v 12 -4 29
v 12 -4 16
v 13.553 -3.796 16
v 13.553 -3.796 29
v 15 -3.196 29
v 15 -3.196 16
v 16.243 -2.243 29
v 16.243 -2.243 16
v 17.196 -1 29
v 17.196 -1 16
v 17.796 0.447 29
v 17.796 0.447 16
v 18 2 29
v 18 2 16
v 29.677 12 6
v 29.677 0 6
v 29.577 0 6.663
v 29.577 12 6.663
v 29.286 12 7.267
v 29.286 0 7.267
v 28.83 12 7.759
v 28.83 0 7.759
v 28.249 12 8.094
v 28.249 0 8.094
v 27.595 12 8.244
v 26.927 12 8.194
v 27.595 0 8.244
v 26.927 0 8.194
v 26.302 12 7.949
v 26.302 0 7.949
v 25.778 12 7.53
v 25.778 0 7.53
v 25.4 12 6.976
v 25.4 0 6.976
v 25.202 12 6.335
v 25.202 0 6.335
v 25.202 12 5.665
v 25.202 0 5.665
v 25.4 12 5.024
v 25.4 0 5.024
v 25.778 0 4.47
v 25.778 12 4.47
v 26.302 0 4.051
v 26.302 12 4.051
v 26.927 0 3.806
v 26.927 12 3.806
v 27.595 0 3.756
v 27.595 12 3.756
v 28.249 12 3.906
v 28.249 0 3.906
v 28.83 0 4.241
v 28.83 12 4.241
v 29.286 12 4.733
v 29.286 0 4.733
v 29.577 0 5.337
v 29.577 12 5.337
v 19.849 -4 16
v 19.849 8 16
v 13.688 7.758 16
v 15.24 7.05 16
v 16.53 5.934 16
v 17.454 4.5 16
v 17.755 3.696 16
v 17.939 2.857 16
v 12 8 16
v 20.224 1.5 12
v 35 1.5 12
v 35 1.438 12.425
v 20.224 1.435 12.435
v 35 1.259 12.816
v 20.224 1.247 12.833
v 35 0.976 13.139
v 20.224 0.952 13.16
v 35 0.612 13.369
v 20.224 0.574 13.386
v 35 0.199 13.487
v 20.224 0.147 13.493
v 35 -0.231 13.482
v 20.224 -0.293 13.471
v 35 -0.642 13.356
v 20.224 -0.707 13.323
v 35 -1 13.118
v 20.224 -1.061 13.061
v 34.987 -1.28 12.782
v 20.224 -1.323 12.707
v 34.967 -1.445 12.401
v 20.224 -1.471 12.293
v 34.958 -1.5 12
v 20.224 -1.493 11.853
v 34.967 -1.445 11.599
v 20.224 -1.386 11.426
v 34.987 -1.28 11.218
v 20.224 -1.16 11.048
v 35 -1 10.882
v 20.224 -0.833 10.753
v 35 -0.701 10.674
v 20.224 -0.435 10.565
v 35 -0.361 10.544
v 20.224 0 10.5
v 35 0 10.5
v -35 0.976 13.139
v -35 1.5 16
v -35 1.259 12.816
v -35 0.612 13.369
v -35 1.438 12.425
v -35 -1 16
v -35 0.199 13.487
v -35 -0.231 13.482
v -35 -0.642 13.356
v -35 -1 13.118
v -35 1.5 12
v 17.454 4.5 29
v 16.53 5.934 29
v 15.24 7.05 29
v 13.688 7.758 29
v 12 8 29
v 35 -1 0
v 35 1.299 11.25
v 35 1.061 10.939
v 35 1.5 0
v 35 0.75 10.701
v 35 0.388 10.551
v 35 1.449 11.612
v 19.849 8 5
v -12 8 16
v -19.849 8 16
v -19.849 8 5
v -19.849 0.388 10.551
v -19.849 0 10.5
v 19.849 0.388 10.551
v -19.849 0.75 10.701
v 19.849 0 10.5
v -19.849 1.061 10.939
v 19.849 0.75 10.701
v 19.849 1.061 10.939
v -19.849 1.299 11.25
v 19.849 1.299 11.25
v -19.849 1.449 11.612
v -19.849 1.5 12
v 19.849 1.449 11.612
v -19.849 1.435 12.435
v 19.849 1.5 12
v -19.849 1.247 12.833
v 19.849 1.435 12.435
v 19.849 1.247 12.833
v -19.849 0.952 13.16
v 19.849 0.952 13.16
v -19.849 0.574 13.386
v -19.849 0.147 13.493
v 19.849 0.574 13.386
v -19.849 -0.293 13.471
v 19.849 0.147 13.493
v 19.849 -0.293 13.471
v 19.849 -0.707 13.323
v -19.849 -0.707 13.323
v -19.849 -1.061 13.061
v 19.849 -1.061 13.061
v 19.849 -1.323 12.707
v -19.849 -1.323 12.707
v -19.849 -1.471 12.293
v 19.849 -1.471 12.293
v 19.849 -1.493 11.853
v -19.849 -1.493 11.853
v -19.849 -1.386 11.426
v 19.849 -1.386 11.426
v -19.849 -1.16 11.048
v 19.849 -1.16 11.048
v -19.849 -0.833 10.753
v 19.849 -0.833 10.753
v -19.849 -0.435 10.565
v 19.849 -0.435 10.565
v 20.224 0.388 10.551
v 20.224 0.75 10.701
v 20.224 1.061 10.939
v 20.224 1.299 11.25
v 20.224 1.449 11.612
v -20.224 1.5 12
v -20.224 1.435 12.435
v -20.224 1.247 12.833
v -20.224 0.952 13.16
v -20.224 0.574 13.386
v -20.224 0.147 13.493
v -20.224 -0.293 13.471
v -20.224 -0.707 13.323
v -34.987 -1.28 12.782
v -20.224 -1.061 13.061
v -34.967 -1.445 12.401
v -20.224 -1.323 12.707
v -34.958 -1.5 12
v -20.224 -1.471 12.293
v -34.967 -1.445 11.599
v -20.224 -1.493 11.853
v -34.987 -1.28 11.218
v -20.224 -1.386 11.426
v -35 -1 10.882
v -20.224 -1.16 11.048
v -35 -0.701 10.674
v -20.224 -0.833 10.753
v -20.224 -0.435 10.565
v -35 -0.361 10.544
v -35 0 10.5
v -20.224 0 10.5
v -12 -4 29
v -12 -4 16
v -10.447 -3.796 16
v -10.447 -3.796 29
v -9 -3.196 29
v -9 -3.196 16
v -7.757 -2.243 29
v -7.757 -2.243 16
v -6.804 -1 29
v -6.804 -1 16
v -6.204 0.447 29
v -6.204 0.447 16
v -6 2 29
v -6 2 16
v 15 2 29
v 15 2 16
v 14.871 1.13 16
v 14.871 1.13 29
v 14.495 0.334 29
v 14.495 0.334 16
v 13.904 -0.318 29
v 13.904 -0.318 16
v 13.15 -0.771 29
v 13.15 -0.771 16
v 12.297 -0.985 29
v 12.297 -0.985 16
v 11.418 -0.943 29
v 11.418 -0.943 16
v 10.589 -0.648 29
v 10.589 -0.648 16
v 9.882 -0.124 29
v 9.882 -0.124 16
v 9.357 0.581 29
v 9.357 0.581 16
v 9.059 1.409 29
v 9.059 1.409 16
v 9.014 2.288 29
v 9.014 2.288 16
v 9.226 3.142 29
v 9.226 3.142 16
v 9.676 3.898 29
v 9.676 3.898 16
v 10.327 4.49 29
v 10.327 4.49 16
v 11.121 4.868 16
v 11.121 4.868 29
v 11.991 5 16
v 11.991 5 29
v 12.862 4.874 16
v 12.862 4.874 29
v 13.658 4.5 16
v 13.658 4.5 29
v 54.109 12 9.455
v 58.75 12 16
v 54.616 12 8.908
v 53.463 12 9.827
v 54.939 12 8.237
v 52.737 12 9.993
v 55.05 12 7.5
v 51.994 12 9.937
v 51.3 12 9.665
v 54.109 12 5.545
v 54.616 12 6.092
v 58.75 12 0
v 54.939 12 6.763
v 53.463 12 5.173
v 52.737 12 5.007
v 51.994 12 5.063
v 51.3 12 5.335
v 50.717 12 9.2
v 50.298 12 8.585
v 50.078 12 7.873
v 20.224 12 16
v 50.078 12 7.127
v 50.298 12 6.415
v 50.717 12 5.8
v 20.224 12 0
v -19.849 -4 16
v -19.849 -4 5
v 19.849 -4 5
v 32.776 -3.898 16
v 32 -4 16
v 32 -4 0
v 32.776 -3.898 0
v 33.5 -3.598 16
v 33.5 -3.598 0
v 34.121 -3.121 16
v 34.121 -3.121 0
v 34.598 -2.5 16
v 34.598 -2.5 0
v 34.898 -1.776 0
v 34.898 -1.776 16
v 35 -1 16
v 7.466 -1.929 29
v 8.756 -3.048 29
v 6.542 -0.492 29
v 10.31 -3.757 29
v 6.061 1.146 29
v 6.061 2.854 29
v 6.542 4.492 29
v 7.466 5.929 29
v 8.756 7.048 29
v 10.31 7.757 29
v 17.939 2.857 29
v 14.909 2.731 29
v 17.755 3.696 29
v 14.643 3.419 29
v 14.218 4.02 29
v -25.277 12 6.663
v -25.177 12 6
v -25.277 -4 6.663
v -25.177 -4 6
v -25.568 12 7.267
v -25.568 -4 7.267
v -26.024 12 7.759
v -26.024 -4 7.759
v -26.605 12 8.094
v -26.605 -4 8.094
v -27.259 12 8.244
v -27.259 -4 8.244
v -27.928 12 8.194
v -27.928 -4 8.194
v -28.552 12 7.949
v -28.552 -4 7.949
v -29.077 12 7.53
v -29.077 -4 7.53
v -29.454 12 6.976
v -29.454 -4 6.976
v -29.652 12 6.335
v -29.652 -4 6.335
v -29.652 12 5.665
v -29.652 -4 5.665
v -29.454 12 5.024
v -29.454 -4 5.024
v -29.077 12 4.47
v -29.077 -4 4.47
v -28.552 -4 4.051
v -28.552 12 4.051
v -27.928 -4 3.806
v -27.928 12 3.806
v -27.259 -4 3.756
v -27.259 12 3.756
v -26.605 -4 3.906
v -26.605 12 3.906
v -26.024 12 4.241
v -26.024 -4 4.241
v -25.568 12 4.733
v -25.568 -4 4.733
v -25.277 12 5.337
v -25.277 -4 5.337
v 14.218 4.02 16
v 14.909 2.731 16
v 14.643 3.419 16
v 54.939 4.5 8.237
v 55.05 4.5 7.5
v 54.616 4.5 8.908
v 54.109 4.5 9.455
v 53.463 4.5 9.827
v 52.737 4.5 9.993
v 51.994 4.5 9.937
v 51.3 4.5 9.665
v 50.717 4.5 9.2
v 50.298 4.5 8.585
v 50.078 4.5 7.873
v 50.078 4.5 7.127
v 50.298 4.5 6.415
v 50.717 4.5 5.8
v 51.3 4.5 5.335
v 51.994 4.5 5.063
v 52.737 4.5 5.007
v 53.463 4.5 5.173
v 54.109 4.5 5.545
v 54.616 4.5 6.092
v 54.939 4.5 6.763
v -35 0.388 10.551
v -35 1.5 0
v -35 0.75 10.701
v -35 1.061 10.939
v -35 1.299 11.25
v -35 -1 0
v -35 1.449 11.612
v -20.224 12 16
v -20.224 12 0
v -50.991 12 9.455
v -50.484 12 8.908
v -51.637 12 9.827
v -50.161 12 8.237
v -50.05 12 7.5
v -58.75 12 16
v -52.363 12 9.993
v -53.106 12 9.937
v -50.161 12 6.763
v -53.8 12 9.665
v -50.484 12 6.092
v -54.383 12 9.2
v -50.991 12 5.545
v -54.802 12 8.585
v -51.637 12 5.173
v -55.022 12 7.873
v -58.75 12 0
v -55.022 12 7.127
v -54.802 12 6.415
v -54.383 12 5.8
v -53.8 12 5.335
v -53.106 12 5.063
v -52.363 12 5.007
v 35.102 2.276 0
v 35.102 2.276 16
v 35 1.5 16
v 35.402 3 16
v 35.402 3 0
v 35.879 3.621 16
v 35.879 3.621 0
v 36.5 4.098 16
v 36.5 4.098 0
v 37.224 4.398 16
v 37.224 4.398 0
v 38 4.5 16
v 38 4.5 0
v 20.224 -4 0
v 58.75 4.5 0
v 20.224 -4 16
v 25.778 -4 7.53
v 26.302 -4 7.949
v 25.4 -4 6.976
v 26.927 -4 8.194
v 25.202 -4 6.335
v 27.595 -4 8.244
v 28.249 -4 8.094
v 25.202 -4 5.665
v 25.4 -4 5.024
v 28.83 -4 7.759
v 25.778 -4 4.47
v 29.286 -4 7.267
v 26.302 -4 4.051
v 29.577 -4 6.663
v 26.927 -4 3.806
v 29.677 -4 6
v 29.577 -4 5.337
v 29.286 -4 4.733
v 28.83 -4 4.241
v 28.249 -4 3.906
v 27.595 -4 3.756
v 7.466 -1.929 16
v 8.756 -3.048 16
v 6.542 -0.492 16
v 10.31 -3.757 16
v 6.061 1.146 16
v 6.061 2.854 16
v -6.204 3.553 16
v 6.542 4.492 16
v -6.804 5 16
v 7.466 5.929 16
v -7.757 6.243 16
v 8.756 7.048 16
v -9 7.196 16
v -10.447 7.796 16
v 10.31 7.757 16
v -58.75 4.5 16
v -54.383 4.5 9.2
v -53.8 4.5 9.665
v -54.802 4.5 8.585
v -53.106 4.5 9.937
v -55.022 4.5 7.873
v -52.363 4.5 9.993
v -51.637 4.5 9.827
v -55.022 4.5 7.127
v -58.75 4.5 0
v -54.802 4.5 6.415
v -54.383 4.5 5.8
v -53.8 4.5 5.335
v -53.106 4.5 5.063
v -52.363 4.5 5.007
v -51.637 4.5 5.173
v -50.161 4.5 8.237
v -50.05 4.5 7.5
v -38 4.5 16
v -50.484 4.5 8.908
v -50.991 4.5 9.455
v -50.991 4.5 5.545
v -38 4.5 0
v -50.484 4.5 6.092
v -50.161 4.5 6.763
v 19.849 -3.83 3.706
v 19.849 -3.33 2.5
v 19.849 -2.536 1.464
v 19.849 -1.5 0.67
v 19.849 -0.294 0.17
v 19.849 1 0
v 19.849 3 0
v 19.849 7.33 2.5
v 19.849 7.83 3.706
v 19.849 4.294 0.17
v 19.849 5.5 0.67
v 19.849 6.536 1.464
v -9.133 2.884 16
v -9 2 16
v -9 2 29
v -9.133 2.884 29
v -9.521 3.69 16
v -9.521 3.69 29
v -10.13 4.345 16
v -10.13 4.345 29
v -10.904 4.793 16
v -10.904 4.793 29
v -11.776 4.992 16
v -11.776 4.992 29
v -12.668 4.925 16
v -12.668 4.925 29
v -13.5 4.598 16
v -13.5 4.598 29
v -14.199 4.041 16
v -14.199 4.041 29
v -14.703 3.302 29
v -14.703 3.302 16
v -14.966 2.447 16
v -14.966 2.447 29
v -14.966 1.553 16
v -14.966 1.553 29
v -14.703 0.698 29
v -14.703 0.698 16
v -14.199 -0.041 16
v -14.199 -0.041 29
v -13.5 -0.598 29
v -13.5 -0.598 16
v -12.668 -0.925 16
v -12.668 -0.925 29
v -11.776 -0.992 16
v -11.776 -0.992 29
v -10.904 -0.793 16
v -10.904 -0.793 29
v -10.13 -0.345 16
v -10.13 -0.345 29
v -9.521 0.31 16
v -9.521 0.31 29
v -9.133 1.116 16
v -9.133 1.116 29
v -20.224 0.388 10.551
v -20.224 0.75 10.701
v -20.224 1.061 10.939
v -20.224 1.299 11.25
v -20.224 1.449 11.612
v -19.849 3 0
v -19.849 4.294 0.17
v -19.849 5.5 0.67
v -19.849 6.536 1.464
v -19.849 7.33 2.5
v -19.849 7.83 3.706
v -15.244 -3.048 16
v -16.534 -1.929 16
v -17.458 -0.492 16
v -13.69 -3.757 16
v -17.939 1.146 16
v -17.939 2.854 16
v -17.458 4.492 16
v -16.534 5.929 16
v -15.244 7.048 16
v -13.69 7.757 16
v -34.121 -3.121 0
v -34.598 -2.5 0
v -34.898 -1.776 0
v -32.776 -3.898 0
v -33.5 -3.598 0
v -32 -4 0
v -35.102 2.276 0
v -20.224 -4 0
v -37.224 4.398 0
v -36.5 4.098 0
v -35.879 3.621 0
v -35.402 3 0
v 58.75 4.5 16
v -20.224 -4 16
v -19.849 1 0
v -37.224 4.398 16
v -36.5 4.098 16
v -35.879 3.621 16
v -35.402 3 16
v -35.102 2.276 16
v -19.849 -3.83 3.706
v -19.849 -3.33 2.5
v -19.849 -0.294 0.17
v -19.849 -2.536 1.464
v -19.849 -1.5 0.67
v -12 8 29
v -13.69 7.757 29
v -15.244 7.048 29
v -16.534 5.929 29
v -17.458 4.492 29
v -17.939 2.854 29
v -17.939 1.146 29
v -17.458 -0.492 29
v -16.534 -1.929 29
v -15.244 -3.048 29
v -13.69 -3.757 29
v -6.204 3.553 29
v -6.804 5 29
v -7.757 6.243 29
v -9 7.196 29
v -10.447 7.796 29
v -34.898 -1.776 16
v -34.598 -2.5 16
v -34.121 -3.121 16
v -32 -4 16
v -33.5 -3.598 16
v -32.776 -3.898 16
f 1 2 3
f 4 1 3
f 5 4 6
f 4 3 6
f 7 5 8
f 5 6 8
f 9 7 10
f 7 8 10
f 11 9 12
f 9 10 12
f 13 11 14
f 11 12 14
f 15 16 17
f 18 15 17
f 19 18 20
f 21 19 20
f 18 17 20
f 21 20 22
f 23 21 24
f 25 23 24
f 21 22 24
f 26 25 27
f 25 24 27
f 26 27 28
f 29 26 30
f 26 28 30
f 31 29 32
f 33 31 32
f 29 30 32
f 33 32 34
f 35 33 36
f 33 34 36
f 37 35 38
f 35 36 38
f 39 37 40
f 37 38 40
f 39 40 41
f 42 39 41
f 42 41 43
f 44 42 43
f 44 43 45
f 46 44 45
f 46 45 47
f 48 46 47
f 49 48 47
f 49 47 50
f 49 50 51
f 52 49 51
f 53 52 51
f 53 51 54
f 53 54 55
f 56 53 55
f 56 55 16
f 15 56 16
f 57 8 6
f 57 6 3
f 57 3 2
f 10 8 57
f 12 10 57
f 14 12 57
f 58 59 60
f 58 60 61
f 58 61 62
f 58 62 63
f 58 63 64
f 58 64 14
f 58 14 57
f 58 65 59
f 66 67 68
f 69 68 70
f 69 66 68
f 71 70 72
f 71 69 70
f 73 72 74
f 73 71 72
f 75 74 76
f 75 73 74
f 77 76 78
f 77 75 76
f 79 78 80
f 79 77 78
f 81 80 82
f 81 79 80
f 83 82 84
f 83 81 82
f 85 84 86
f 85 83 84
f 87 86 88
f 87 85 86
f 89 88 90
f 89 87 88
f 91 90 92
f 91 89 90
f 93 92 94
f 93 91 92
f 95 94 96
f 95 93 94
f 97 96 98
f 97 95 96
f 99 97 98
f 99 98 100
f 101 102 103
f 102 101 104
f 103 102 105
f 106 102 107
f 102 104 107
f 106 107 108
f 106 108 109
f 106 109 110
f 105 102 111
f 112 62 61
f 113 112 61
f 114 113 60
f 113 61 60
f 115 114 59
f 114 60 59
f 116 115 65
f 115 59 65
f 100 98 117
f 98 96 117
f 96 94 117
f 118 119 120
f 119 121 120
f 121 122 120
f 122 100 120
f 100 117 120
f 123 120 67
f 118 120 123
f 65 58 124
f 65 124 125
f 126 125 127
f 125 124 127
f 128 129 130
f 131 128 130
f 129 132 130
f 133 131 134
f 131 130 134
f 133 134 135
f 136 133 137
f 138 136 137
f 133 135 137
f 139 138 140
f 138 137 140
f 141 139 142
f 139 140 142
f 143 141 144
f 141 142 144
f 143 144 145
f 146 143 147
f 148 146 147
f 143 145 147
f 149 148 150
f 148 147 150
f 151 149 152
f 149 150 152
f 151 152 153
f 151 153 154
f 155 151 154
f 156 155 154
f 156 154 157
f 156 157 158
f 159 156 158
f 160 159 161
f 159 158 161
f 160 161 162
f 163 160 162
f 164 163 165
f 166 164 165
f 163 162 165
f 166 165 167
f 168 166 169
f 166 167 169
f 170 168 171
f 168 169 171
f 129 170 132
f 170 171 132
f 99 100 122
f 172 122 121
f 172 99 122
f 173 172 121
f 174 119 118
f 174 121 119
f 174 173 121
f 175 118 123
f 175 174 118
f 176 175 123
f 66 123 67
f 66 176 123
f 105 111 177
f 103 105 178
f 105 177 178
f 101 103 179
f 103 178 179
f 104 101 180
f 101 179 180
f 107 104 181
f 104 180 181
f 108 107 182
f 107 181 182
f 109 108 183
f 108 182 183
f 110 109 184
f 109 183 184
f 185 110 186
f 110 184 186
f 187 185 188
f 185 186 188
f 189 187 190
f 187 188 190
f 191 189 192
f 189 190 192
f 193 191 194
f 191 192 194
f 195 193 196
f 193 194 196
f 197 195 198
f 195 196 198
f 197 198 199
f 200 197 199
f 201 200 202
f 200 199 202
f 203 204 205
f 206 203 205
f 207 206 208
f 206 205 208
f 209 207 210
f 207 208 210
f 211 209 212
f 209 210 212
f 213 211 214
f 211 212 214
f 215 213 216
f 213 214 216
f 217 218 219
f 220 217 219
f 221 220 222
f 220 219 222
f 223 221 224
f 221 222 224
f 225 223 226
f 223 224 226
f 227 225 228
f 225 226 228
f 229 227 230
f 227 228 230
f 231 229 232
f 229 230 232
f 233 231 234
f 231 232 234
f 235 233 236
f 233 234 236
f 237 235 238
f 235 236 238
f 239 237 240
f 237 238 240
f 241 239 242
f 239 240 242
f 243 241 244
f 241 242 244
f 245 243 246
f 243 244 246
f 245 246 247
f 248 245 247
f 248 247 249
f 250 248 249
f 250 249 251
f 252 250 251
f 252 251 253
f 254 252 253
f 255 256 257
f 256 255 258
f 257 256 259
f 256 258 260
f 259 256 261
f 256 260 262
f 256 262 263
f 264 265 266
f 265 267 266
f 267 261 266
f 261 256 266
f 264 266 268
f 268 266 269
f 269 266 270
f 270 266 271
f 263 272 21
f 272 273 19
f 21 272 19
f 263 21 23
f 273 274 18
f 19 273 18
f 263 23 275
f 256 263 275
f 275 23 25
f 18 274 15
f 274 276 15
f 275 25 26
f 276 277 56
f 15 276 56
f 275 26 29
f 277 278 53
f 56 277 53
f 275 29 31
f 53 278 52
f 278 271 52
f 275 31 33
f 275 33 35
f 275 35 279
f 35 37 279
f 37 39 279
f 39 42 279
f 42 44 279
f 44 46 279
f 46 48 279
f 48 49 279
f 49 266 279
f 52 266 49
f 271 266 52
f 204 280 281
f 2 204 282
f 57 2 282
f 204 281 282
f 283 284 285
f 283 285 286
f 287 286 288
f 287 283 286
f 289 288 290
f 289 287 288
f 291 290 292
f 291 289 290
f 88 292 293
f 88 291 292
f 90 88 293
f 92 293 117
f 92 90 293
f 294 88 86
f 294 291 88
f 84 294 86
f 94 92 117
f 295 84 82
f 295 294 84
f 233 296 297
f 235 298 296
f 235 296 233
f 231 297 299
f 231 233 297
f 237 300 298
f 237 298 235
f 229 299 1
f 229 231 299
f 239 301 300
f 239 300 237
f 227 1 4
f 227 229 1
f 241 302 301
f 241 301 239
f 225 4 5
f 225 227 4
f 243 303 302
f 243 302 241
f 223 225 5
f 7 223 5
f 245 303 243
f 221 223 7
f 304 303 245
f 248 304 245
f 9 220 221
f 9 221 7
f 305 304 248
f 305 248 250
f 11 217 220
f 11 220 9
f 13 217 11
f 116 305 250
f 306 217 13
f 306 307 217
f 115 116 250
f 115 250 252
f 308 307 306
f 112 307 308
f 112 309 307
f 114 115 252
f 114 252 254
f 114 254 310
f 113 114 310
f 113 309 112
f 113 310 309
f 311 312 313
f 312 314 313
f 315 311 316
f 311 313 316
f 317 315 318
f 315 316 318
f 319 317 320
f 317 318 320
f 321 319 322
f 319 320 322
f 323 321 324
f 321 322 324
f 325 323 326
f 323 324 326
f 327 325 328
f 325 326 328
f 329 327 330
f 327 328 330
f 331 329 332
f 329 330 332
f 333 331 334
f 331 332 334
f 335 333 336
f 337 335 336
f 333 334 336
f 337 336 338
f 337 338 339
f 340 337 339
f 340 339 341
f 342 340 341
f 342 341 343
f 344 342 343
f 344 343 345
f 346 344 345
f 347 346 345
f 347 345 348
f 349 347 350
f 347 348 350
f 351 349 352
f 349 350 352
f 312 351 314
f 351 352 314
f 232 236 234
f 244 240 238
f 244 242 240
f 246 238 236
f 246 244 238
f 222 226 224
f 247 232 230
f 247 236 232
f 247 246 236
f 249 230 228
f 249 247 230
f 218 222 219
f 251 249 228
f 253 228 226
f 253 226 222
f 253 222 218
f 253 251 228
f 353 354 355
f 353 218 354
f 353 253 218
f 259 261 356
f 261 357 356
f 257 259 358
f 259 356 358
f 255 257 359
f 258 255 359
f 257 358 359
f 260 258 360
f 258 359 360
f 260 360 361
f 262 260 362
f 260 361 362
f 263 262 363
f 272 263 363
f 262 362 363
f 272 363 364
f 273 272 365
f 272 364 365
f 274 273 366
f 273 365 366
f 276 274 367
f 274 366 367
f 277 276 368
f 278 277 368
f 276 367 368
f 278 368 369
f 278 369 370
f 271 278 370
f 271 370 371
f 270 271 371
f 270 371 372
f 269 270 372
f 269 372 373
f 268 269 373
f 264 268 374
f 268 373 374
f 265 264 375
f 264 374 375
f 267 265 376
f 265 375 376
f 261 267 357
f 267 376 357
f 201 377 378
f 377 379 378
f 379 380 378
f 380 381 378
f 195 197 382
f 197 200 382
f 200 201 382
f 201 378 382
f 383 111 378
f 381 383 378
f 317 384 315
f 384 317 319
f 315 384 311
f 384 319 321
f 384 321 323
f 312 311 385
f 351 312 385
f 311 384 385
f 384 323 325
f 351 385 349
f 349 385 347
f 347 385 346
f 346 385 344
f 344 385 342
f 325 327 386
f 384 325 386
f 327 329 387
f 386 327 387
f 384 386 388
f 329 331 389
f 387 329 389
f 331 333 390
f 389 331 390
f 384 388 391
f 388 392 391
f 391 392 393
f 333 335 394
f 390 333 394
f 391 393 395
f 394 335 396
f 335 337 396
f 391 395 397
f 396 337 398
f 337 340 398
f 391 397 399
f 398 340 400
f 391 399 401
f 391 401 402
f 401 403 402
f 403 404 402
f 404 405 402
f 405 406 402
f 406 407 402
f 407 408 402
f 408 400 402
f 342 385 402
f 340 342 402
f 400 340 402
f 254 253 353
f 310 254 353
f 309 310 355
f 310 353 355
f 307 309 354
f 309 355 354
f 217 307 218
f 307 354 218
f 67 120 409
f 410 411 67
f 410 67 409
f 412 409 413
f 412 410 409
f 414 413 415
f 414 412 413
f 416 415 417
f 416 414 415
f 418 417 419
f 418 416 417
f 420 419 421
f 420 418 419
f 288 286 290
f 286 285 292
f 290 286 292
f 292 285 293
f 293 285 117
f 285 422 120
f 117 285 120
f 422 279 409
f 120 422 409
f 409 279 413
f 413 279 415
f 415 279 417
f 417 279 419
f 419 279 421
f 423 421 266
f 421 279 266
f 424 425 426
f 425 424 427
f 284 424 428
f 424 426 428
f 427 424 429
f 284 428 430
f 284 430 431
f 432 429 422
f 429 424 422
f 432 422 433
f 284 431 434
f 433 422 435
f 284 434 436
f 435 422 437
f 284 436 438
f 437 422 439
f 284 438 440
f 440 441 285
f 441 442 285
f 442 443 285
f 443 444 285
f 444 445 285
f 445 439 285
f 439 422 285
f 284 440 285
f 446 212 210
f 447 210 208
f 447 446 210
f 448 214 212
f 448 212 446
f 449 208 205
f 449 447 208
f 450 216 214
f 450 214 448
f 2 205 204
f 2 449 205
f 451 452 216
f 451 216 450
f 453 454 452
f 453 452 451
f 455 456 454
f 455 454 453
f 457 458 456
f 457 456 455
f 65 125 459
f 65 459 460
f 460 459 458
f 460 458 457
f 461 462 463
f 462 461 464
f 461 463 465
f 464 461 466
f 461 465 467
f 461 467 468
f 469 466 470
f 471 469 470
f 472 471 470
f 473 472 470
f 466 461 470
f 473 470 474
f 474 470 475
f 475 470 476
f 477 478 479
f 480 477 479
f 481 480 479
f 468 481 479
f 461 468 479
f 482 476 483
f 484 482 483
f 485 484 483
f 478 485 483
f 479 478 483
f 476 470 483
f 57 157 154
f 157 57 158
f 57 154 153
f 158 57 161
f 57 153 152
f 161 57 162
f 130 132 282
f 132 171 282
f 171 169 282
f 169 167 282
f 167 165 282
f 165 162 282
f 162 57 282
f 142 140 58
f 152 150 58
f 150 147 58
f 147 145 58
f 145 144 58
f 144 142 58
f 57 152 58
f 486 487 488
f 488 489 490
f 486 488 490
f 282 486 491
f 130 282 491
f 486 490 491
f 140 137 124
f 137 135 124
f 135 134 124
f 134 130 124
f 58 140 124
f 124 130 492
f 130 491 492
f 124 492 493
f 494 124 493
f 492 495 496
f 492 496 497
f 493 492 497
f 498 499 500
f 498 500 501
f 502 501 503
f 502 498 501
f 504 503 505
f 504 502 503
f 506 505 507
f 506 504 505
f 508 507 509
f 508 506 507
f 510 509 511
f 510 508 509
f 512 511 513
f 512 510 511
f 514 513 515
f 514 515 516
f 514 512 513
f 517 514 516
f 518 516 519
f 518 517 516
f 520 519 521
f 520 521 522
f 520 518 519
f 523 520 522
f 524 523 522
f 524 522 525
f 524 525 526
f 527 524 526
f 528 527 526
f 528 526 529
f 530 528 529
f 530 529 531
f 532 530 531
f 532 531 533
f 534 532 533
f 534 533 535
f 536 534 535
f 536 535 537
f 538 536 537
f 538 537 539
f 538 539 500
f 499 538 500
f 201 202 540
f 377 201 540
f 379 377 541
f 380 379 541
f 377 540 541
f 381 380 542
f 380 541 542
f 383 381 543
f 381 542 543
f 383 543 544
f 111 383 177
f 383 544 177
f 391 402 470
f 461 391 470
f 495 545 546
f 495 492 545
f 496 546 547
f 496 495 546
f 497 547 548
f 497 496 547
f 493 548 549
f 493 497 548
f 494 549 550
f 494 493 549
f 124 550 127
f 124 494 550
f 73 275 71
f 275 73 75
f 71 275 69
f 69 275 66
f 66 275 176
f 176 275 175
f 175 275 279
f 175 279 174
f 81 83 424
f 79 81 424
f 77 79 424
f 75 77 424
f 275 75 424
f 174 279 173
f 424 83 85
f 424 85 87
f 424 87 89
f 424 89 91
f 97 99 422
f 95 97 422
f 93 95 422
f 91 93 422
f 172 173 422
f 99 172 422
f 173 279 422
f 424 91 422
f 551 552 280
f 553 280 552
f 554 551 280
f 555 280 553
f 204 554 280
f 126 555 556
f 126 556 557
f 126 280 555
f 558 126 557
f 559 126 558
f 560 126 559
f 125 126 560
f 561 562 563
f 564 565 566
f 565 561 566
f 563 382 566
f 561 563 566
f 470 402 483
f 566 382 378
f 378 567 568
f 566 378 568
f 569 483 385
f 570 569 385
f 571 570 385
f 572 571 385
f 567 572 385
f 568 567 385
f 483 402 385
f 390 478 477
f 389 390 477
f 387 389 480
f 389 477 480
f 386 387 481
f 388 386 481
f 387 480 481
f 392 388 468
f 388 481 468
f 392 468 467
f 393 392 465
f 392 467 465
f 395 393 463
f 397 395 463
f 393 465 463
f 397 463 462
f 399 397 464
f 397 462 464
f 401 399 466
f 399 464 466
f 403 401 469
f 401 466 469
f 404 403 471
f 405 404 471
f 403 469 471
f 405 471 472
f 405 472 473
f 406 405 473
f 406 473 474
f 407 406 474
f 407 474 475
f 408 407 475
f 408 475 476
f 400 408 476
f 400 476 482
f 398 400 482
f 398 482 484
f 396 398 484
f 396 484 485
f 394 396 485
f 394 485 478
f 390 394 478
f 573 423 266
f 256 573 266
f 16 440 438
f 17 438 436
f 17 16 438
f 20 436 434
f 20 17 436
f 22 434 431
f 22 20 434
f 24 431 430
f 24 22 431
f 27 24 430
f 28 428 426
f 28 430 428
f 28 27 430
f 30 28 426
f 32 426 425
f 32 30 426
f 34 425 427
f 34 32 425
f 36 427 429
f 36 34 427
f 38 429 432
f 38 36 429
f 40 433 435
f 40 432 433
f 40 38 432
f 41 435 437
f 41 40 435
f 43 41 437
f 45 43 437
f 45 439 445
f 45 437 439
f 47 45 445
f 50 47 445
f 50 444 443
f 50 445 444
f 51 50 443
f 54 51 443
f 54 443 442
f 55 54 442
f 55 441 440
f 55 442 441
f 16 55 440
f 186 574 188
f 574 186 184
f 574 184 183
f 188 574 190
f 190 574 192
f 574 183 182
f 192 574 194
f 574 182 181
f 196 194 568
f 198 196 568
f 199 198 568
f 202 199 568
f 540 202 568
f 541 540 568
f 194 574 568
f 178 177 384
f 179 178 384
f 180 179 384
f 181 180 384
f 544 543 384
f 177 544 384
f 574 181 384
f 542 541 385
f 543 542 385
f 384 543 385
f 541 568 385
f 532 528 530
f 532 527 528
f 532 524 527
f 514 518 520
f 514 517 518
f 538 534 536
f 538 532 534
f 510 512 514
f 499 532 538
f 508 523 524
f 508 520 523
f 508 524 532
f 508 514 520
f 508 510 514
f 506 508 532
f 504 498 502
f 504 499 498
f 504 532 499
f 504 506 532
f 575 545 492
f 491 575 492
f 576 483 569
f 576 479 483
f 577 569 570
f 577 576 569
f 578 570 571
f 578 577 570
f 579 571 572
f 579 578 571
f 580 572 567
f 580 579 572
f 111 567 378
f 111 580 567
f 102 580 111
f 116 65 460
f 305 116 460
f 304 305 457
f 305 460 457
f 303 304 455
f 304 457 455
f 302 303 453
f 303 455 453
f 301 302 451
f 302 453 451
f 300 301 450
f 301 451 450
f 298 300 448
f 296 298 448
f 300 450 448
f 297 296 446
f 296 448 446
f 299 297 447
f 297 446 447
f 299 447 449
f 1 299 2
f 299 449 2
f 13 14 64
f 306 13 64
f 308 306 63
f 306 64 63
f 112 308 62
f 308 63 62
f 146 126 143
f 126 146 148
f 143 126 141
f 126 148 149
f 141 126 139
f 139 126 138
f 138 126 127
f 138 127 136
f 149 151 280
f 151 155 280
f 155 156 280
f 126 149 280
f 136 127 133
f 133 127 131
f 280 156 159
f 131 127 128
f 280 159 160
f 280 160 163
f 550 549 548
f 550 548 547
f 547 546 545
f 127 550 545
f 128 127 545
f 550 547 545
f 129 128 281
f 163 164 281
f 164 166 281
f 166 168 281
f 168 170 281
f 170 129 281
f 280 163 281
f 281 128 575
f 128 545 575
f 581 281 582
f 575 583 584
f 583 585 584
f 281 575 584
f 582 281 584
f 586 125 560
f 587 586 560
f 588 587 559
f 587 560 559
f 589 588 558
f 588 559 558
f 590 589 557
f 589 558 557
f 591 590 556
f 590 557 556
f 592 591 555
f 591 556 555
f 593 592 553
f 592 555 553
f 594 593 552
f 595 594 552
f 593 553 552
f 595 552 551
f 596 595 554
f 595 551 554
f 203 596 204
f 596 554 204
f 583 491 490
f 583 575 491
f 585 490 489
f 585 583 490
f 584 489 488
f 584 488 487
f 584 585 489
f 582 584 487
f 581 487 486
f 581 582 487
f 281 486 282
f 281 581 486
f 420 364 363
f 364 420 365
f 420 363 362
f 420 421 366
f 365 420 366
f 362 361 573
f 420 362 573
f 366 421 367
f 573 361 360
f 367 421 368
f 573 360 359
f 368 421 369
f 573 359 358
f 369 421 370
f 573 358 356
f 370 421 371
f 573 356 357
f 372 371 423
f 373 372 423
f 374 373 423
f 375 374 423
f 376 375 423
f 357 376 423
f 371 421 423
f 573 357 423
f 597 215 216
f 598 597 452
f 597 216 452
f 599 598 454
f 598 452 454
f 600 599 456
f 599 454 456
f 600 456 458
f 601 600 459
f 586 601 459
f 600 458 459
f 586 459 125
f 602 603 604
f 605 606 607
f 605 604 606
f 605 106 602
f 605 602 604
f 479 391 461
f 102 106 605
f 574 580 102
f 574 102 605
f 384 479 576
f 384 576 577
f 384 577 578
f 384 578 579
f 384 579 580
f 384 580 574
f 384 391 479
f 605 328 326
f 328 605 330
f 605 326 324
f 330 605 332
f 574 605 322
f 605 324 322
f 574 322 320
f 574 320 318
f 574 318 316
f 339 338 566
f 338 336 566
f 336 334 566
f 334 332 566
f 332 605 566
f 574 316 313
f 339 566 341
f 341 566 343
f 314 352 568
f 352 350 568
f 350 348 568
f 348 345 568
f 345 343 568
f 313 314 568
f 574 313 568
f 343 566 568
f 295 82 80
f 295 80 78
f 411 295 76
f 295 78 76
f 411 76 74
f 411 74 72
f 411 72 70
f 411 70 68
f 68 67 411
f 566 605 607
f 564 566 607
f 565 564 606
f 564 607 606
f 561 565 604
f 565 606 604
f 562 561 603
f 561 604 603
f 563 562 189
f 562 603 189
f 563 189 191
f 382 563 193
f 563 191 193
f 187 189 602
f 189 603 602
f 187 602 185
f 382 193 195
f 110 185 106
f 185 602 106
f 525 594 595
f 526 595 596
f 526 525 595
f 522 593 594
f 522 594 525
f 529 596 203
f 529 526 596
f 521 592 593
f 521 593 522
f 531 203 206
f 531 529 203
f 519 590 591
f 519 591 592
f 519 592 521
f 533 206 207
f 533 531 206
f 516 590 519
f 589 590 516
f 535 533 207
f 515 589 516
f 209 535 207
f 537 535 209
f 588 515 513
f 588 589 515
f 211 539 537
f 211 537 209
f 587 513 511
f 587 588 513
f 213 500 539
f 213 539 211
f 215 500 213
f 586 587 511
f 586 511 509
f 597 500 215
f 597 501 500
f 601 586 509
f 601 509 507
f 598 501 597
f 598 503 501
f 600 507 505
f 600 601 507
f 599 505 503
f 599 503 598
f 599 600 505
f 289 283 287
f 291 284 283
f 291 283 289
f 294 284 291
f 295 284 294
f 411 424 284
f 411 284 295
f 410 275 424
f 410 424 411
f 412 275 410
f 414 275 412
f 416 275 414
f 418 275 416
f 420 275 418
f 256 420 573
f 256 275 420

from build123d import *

# Parameters (mm, degrees)
F0_W     = 23.75
F0_H     = 3.5
F1_DEPTH = 16
F0_R     = 3
F2_DEPTH = 29
F3_R     = 2.25
F3_R_2   = 2.5
F4_DEPTH = 12.5
F5_R     = 3
F5_2_R   = 3
F7_DEPTH = 40
F8_R     = 5


with BuildPart() as f1:
    # F0 (on Top) → F1 (new body)
    with BuildSketch(Plane.XY):
        with Locations((-46.875, 6.25)):
            Rectangle(F0_W, F0_H)
        Polygon((-20.2244706452, -4), (-20.2244706452, 8), (-35, 8), (-35, 4.5), (-35, -4), align=None)
        Polygon((-35, 8), (-20.2244706452, 8), (-20.2244706452, 12), (-58.75, 12), (-58.75, 8), align=None)
    extrude(amount=F1_DEPTH)


with BuildPart() as f1b:
    # F0 (on Top) → F1, piece 2 (new body)
    with BuildSketch(Plane.XY):
        with BuildLine():
            ThreePointArc((-12, -4), (-18, 2.0000000001), (-11.9999999997, 8))
            Line((-11.9999999997, 8), (-19.8490470648, 8))
            Line((-19.8490470648, 8), (-19.8490470648, -4))
            Line((-19.8490470648, -4), (-12, -4))
        make_face()
        with BuildLine():
            ThreePointArc((-6, 2), (-7.7573593128, 6.242640687), (-11.9999999997, 8))
            ThreePointArc((-11.9999999997, 8), (-18, 2.0000000001), (-12, -4))
            ThreePointArc((-12, -4), (-7.7573593129, -2.2426406871), (-6, 2))
        make_face()
        with Locations((-12, 2)):
            Circle(F0_R, mode=Mode.SUBTRACT)
        with Locations((-12, 2)):
            Circle(F0_R)
        with BuildLine():
            ThreePointArc((12, -4), (6, 2.0000000207), (12.0000000413, 8))
            Line((12.0000000413, 8), (-11.9999999997, 8))
            ThreePointArc((-11.9999999997, 8), (-7.7573593128, 6.242640687), (-6, 2))
            ThreePointArc((-6, 2), (-7.7573593129, -2.2426406871), (-12, -4))
            Line((-12, -4), (12, -4))
        make_face()
        with BuildLine():
            ThreePointArc((18, 2), (17.8620020617, 3.2794263668), (17.4543560573, 4.5))
            ThreePointArc((17.4543560573, 4.5), (15.2403703666, 7.049752458), (12.0000000413, 8))
            ThreePointArc((12.0000000413, 8), (6, 2.0000000207), (12, -4))
            ThreePointArc((12, -4), (16.2426406871, -2.2426406871), (18, 2))
        make_face()
        with BuildLine():
            ThreePointArc((13.6583123952, 4.5), (14.6433820369, 3.4186371655), (15, 2))
            ThreePointArc((15, 2), (9.3566179631, 0.5813628345), (13.6583123952, 4.5))
        make_face(mode=Mode.SUBTRACT)
        with BuildLine():
            ThreePointArc((13.6583123952, 4.5), (9.3566179631, 0.5813628345), (15, 2))
            ThreePointArc((15, 2), (14.6433820369, 3.4186371655), (13.6583123952, 4.5))
        make_face()
        with BuildLine():
            ThreePointArc((12.0000000413, 8), (15.2403703666, 7.049752458), (17.4543560573, 4.5))
            ThreePointArc((17.4543560573, 4.5), (17.8620020617, 3.2794263668), (18, 2))
            ThreePointArc((18, 2), (16.2426406871, -2.2426406871), (12, -4))
            Line((12, -4), (19.8490470648, -4))
            Line((19.8490470648, -4), (19.8490470648, 8))
            Line((19.8490470648, 8), (12.0000000413, 8))
        make_face()
    extrude(amount=F1_DEPTH)

    # F0 (on Top) → F2 (join)
    with BuildSketch(Plane.XY):
        with BuildLine():
            ThreePointArc((-6, 2), (-7.7573593128, 6.242640687), (-11.9999999997, 8))
            ThreePointArc((-11.9999999997, 8), (-18, 2.0000000001), (-12, -4))
            ThreePointArc((-12, -4), (-7.7573593129, -2.2426406871), (-6, 2))
        make_face()
        with Locations((-12, 2)):
            Circle(F0_R, mode=Mode.SUBTRACT)
        with BuildLine():
            ThreePointArc((18, 2), (17.8620020617, 3.2794263668), (17.4543560573, 4.5))
            ThreePointArc((17.4543560573, 4.5), (15.2403703666, 7.049752458), (12.0000000413, 8))
            ThreePointArc((12.0000000413, 8), (6, 2.0000000207), (12, -4))
            ThreePointArc((12, -4), (16.2426406871, -2.2426406871), (18, 2))
        make_face()
        with BuildLine():
            ThreePointArc((13.6583123952, 4.5), (14.6433820369, 3.4186371655), (15, 2))
            ThreePointArc((15, 2), (9.3566179631, 0.5813628345), (13.6583123952, 4.5))
        make_face(mode=Mode.SUBTRACT)
    extrude(amount=F2_DEPTH)


with BuildPart() as f1c:
    # F0 (on Top) → F1, piece 3 (new body)
    with BuildSketch(Plane.XY):
        Polygon((35, 8), (20.2244706452, 8), (20.2244706452, -4), (35, -4), (35, 4.5), align=None)
        with Locations((46.875, 6.25)):
            Rectangle(F0_W, F0_H)
        Polygon((20.2244706452, 12), (20.2244706452, 8), (35, 8), (58.75, 8), (58.75, 12), align=None)
    extrude(amount=F1_DEPTH)


with BuildPart() as f4_tool:
    # F3 (on Front) → F4 (new body, symmetric)
    with BuildSketch(Plane.XZ):
        with Locations((-27.4271778762, 6)):
            Circle(F3_R)
        with Locations((27.4271778762, 6)):
            Circle(F3_R)
        with Locations((-52.55, 7.5)):
            Circle(F3_R_2)
        with Locations((52.55, 7.5)):
            Circle(F3_R_2)
    extrude(amount=F4_DEPTH, both=True)


with BuildPart() as f1_1:
    add(f1.part)

    # F4: cut by f4_tool
    add(f4_tool.part, mode=Mode.SUBTRACT)

    # F5
    f5_edges = [f1_1.edges().sort_by_distance(p)[0] for p in [
        (-35, -4, 8),
        (-35, 4.5, 8),
    ]]
    fillet(f5_edges, radius=F5_R)


with BuildPart() as f1c_1:
    add(f1c.part)

    # F4: cut by f4_tool
    add(f4_tool.part, mode=Mode.SUBTRACT)

    # F5#2
    f5_2_edges = [f1c_1.edges().sort_by_distance(p)[0] for p in [
        (35, 4.5, 8),
        (35, -4, 8),
    ]]
    fillet(f5_2_edges, radius=F5_2_R)


with BuildPart() as f7_tool:
    # F6 (on Right) → F7 (new body, symmetric)
    with BuildSketch(Plane.YZ):
        with BuildLine():
            ThreePointArc((0, 10.5), (1.0606601718, 10.9393398282), (1.5, 12))
            ThreePointArc((1.5, 12), (-1.0606601718, 13.0606601718), (0, 10.5))
        make_face()
    extrude(amount=F7_DEPTH, both=True)


with BuildPart() as f1_2:
    add(f1_1.part)

    # F7: cut by f7_tool
    add(f7_tool.part, mode=Mode.SUBTRACT)


with BuildPart() as f1b_1:
    add(f1b.part)

    # F7: cut by f7_tool
    add(f7_tool.part, mode=Mode.SUBTRACT)

    # F8
    f8_edges = [f1b_1.edges().sort_by_distance(p)[0] for p in [
        (0, -4, 0),
        (0, 8, 0),
    ]]
    fillet(f8_edges, radius=F8_R)


with BuildPart() as f1c_2:
    add(f1c_1.part)

    # F7: cut by f7_tool
    add(f7_tool.part, mode=Mode.SUBTRACT)


solid = Compound([f1_2.part, f1b_1.part, f1c_2.part])
